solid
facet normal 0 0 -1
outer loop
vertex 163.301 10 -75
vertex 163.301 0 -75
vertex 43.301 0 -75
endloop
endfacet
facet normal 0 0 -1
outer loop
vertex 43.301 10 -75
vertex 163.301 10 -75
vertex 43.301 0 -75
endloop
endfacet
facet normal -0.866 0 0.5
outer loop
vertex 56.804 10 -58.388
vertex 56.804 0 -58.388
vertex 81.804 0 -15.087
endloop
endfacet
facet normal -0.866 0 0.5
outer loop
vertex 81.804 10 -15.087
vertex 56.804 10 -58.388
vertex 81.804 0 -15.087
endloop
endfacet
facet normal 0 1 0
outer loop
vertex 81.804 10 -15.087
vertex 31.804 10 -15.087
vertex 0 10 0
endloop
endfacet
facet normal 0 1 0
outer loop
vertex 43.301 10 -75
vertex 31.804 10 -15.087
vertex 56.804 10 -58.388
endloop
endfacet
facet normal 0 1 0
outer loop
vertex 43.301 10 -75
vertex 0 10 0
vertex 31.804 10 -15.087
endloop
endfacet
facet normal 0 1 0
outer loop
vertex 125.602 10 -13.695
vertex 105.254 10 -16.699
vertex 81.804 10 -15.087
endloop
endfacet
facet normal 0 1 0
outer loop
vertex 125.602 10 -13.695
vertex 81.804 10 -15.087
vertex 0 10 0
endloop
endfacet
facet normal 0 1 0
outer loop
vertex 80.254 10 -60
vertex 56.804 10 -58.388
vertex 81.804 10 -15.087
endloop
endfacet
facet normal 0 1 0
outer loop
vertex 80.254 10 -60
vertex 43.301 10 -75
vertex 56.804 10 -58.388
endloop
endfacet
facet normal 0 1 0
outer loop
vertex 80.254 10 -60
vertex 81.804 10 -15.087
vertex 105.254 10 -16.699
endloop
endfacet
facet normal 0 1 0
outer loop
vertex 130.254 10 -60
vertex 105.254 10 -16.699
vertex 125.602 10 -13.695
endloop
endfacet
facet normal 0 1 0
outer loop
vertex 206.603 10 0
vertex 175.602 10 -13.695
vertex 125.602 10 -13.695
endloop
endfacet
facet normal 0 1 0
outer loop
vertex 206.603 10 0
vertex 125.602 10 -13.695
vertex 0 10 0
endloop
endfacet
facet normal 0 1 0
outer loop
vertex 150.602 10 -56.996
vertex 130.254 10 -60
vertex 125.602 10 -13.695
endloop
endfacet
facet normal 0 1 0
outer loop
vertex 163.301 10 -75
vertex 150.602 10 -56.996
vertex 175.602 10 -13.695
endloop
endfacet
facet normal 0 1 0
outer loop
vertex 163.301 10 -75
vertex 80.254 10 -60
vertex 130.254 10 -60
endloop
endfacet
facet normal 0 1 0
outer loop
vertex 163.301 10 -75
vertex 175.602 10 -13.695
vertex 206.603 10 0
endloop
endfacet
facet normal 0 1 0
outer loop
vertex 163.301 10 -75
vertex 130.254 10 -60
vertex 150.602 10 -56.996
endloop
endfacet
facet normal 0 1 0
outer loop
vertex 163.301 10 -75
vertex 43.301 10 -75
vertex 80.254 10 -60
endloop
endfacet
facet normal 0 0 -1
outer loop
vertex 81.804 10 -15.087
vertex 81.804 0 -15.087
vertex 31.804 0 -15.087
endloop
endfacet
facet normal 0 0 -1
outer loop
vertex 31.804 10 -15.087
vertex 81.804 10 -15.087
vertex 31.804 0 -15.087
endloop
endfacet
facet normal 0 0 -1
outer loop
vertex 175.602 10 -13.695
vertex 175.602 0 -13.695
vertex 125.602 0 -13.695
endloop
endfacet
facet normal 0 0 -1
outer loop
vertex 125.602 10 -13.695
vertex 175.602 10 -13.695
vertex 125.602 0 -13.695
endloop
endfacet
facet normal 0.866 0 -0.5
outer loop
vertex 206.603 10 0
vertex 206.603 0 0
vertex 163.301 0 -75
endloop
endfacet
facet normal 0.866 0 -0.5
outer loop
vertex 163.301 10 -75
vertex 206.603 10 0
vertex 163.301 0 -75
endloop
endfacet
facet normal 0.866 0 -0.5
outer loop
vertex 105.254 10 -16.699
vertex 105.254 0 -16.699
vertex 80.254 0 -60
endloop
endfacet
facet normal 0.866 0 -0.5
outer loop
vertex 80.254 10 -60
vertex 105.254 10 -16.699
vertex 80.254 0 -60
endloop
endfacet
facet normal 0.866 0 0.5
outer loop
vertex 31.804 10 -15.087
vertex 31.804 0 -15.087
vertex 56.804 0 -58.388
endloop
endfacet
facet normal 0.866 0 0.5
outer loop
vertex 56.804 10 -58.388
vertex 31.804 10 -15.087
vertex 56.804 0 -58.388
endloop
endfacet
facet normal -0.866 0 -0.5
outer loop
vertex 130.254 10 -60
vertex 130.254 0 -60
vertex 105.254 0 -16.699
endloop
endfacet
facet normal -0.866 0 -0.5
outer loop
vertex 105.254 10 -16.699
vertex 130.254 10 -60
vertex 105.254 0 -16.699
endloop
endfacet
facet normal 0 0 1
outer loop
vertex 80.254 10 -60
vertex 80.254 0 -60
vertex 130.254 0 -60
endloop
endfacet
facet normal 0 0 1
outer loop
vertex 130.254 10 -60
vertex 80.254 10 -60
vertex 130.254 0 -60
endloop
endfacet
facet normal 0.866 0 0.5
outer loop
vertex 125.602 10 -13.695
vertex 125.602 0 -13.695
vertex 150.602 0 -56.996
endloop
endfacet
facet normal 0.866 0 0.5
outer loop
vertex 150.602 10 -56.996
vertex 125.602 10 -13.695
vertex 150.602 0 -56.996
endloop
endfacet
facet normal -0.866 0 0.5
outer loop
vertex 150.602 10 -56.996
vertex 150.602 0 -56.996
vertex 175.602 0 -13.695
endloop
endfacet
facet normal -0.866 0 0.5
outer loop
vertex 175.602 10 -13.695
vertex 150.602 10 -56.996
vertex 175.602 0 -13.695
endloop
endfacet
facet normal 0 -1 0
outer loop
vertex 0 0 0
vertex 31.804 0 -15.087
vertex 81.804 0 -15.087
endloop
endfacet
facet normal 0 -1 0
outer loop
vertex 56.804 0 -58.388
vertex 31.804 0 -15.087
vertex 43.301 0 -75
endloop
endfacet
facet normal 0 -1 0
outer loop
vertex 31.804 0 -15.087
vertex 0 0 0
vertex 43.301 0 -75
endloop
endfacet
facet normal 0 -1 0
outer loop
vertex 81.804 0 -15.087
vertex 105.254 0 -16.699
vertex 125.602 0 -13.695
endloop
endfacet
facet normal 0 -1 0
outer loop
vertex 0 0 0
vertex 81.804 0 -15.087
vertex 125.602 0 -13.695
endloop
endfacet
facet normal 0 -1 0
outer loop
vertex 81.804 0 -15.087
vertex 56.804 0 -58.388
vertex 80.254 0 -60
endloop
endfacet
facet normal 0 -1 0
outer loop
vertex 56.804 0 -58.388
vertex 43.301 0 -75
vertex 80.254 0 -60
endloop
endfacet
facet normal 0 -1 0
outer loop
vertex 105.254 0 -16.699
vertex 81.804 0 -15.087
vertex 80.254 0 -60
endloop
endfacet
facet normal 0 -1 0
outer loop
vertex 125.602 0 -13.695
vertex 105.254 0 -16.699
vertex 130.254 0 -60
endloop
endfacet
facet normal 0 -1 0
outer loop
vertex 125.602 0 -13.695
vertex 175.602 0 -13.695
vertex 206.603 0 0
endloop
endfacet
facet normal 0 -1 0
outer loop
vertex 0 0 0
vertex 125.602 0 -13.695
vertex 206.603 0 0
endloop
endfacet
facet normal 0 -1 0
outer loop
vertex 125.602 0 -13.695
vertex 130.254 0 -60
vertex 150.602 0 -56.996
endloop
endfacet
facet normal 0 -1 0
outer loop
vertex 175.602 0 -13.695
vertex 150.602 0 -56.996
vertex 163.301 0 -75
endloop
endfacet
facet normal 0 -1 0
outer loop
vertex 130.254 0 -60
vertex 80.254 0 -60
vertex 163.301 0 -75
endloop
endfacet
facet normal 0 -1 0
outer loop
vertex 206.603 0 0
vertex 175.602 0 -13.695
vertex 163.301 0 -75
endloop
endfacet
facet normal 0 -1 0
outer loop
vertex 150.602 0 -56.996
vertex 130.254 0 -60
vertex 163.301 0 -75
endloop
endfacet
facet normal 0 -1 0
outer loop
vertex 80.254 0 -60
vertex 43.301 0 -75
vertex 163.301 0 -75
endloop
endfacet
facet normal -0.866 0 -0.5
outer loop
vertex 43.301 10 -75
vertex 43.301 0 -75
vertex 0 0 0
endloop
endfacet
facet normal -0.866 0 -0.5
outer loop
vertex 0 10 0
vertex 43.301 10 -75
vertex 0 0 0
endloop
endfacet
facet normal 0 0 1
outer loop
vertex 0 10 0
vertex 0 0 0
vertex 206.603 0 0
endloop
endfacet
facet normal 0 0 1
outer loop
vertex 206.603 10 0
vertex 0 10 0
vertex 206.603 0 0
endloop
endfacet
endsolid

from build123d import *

# Parameters (mm, degrees)
BOSS_EXTRUDE1_DEPTH = 10


with BuildPart() as part:
    # Sketch1 → Boss-Extrude1 (new body)
    with BuildSketch(Plane(origin=(0, 0, 0), x_dir=(1, 0, 0), z_dir=(0, 1, 0))):
        Polygon((43.301270189, 75), (0, 0), (206.602540378, 0), (163.301270189, 75), align=None)
        Polygon((80.254006688, 60), (130.254006688, 60), (105.254006688, 16.698729811), align=None, mode=Mode.SUBTRACT)
        Polygon((125.601586083, 13.695227923), (150.601586083, 56.996498112), (175.601586083, 13.695227923), align=None, mode=Mode.SUBTRACT)
        Polygon((31.804368121, 15.086781489), (56.804368121, 58.388051678), (81.804368121, 15.086781489), align=None, mode=Mode.SUBTRACT)
    extrude(amount=BOSS_EXTRUDE1_DEPTH)


solid = part.part
